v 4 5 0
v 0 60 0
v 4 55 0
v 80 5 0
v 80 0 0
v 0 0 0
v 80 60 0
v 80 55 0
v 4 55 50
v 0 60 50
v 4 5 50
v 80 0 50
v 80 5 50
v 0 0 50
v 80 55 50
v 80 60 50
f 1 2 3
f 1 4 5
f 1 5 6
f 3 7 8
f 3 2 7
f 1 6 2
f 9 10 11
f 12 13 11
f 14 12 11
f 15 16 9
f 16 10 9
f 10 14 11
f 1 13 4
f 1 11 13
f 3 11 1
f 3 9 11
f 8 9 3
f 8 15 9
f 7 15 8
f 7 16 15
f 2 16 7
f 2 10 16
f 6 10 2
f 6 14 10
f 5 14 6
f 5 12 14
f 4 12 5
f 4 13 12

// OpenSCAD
$fn = 32;

// ----------------------------------------------------------------------
// Structural section: channel 80 x 60 mm
// ----------------------------------------------------------------------

// --- parameters (mm) ---
sec_w = 80;               // channel width, X
sec_h = 60;               // channel height, Y
flange_t = 5;             // flange thickness
web_t = 4;                // web thickness
plate_t = 50;             // cut length, Z (extrusion height)

profile = [[0, 0], [80, 0], [80, 5], [4, 5], [4, 55], [80, 55], [80, 60], [0, 60]];  // primary outline, 8 points, counter clockwise

// --- the one profile operation ---
linear_extrude(height = plate_t) polygon(points = profile);
